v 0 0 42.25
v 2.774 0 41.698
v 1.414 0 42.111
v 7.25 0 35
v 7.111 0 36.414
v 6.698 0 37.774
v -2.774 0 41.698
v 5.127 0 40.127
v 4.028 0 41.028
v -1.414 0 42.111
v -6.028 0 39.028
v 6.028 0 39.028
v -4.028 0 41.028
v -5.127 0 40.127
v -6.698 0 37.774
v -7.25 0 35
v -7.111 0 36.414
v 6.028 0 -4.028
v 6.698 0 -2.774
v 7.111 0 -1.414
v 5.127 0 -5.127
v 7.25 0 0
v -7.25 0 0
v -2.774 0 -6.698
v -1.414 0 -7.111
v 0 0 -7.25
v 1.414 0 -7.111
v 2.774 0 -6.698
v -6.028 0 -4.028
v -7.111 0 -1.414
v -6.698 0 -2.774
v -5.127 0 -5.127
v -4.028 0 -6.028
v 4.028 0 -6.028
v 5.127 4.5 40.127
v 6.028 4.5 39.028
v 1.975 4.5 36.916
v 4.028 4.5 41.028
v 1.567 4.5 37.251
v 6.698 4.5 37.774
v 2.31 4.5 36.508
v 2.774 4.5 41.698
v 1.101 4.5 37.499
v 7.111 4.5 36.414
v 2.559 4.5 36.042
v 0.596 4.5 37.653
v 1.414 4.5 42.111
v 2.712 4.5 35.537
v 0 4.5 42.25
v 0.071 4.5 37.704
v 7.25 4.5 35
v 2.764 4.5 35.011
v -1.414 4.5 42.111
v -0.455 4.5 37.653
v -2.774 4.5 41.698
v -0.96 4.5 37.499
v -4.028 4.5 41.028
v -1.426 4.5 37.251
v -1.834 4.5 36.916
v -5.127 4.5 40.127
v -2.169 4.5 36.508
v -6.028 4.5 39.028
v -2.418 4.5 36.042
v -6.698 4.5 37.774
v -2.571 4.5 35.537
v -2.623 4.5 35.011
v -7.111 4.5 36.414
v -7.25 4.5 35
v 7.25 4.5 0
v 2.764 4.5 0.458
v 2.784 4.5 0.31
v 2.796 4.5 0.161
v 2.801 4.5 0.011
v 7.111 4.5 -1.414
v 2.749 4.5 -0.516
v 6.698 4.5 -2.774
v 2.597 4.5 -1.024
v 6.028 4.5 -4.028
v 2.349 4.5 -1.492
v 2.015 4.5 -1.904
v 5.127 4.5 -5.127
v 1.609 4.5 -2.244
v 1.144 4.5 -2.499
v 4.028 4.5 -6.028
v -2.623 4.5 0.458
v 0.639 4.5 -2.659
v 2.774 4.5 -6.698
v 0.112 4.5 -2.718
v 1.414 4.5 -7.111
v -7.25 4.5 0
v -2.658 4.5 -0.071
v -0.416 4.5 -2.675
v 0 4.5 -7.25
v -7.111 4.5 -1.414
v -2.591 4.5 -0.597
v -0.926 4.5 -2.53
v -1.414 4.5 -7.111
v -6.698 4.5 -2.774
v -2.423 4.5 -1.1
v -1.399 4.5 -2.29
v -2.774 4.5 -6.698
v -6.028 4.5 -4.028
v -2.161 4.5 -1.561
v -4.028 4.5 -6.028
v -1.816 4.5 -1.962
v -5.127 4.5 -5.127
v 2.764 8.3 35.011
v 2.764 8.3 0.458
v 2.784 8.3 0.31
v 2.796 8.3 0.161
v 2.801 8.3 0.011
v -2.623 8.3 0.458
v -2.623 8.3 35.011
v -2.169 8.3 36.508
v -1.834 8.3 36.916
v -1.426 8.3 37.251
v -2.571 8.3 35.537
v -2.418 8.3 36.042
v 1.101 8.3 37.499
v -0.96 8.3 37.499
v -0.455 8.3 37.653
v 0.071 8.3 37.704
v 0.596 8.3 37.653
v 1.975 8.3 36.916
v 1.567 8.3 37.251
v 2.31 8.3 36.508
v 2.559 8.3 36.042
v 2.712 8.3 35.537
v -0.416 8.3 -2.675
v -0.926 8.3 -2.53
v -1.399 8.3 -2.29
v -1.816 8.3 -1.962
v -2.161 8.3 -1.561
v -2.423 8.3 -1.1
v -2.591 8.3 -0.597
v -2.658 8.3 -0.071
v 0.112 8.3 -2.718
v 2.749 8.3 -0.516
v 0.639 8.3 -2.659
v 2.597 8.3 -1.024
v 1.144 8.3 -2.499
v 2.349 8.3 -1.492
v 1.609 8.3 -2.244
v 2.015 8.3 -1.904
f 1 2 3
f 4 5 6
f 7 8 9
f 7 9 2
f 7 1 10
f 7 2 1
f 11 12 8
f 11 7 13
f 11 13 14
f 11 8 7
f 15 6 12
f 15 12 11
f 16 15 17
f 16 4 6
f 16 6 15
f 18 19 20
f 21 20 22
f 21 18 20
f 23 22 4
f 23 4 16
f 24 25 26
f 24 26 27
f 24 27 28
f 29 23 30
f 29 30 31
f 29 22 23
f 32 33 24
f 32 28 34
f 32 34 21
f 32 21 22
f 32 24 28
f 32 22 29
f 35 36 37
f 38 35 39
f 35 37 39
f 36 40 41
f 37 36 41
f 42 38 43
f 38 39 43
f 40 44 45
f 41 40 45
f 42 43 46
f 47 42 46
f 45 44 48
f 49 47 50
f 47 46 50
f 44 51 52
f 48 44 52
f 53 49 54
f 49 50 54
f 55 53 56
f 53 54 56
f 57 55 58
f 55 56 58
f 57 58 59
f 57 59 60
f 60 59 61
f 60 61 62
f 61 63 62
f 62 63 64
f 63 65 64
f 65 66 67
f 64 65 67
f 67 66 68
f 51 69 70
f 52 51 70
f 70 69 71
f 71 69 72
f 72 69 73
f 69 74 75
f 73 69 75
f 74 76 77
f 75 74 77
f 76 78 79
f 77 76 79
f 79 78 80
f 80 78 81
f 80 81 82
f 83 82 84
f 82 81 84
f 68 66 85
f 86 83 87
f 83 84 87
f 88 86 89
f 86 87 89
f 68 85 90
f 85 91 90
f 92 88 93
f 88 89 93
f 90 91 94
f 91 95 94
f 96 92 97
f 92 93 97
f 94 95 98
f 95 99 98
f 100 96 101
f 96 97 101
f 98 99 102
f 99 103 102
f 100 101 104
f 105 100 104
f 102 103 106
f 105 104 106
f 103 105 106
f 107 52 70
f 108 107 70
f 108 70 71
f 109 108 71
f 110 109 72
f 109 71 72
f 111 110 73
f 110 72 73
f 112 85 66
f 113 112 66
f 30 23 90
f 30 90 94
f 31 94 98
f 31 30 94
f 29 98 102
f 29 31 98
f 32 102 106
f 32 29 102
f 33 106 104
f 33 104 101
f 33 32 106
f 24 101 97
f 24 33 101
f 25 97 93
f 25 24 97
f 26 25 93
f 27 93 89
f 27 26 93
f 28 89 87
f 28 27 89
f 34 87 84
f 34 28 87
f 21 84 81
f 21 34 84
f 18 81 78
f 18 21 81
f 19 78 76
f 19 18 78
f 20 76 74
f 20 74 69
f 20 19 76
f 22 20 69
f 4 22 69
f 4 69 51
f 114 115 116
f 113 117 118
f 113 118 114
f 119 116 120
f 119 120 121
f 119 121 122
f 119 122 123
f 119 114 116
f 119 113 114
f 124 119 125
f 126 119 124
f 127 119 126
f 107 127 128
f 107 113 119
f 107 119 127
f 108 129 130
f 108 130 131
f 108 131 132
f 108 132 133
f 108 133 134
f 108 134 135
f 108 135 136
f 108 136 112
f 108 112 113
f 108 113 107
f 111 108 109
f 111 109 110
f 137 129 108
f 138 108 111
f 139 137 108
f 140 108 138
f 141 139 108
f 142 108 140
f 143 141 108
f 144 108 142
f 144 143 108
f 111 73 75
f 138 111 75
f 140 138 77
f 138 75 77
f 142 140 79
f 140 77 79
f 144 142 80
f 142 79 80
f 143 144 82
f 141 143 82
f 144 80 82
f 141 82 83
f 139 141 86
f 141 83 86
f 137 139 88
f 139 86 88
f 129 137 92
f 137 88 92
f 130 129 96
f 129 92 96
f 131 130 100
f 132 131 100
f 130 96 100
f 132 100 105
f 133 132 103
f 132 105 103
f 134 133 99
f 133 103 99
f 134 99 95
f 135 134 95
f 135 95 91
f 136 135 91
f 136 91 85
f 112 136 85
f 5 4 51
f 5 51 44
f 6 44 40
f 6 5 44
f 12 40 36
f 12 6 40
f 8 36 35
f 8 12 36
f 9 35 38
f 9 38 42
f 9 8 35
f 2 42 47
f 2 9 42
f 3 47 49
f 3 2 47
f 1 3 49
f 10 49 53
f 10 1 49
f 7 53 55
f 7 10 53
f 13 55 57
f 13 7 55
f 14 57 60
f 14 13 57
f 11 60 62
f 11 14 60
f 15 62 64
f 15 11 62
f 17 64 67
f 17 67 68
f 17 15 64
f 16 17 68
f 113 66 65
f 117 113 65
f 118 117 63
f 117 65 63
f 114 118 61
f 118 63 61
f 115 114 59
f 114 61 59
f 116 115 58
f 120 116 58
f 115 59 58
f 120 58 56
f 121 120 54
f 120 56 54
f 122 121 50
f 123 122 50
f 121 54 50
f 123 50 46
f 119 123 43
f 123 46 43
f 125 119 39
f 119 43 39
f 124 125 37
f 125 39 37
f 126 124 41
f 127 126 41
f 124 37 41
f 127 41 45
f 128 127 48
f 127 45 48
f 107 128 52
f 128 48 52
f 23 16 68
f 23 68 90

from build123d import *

# Parameters (mm, degrees)
BOSS_EXTRUDE1_DEPTH = 4.5
BOSS_EXTRUDE2_DEPTH = 3.8
BOSS_EXTRUDE3_DEPTH = 8.1
CUT_EXTRUDE2_START  = -8.1
CUT_EXTRUDE2_DEPTH  = 8.1


with BuildPart() as part:
    # Sketch1 → Boss-Extrude1 (new body)
    with BuildSketch(Plane(origin=(0, 0, 0), x_dir=(1, 0, 0), z_dir=(0, 1, 0))):
        with BuildLine():
            Line((7.25, 0), (7.25, -35))
            ThreePointArc((7.25, -35), (0, -42.25), (-7.25, -35))
            Line((-7.25, -35), (-7.25, 0))
            ThreePointArc((-7.25, 0), (0, 7.25), (7.25, 0))
        make_face()
    extrude(amount=BOSS_EXTRUDE1_DEPTH)

    # Sketch3 → Boss-Extrude2 (add)
    with BuildSketch(Plane(origin=(0, 4.5, 0), x_dir=(1, 0, 0), z_dir=(0, 1, 0))):
        with BuildLine():
            Line((-2.622571491, -0.457666807), (-2.622571491, -0.011296081))
            Line((-2.622571491, -0.011296081), (2.763792269, -0.011296081))
            Line((2.763792269, -0.011296081), (2.763792269, -0.457666807))
            ThreePointArc((2.763792269, -0.457666807), (2.791332039, -0.235236185), (2.800532634, -0.011296081))
            ThreePointArc((2.800532634, -0.011296081), (-0.153329714, 2.709425568), (-2.622571491, -0.457666807))
        make_face()
        with BuildLine():
            Line((2.763792269, -0.011296081), (-2.622571491, -0.011296081))
            Line((-2.622571491, -0.011296081), (-2.622571491, -0.457666807))
            ThreePointArc((-2.622571491, -0.457666807), (0.070610389, -2.741218326), (2.763792269, -0.457666807))
            Line((2.763792269, -0.457666807), (2.763792269, -0.011296081))
        make_face()
        with BuildLine():
            ThreePointArc((2.763792269, -0.457666807), (0.070610389, -2.741218326), (-2.622571491, -0.457666807))
            Line((-2.622571491, -0.457666807), (-2.622571491, -35.011296081))
            ThreePointArc((-2.622571491, -35.011296081), (0.070610389, -32.318114201), (2.763792269, -35.011296081))
            Line((2.763792269, -35.011296081), (2.763792269, -0.457666807))
        make_face()
        with BuildLine():
            ThreePointArc((2.763792269, -35.011296081), (0.070610389, -32.318114201), (-2.622571491, -35.011296081))
            Line((-2.622571491, -35.011296081), (2.763792269, -35.011296081))
        make_face()
        with BuildLine():
            Line((2.763792269, -35.011296081), (-2.622571491, -35.011296081))
            ThreePointArc((-2.622571491, -35.011296081), (0.070610389, -37.704477961), (2.763792269, -35.011296081))
        make_face()
    extrude(amount=BOSS_EXTRUDE2_DEPTH)

    # Sketch4 → Boss-Extrude3 (add)
    with BuildSketch(Plane(origin=(0, 8.3, 0), x_dir=(1, 0, 0), z_dir=(0, 1, 0))):
        with BuildLine():
            Line((7.25308141, 0.014627933), (7.323691799, -34.996668148))
            ThreePointArc((7.323691799, -34.996668148), (0.085238322, -42.264377491), (-7.182471021, -35.025924014))
            Line((-7.182471021, -35.025924014), (-7.25308141, -0.014627933))
            ThreePointArc((-7.25308141, -0.014627933), (-0.014627933, 7.25308141), (7.25308141, 0.014627933))
        make_face()
    extrude(amount=BOSS_EXTRUDE3_DEPTH)

    # Sketch6 → Cut-Extrude2 (cut)
    with BuildSketch(Plane(origin=(0, 16.4, 0), x_dir=(1, 0, 0), z_dir=(0, 1, 0)).offset(CUT_EXTRUDE2_START)):
        with BuildLine():
            Line((-24.579752733, 25.941605668), (4.44385737, 25.941605668))
            Line((4.44385737, 25.941605668), (4.44385737, 5.732323751))
            ThreePointArc((4.44385737, 5.732323751), (6.509808413, 3.198405594), (7.25308141, 0.014627933))
            Line((7.25308141, 0.014627933), (7.323691799, -34.996668148))
            ThreePointArc((7.323691799, -34.996668148), (6.567208075, -38.236450718), (4.44385737, -40.797669277))
            Line((4.44385737, -40.797669277), (4.44385737, -52.11567356))
            Line((4.44385737, -52.11567356), (-24.579752733, -52.11567356))
            Line((-24.579752733, -52.11567356), (-24.579752733, -65.847384837))
            Line((-24.579752733, -65.847384837), (23.383123672, -65.847384837))
            Line((23.383123672, -65.847384837), (23.383123672, 36.458721402))
            Line((23.383123672, 36.458721402), (-24.579752733, 36.458721402))
            Line((-24.579752733, 36.458721402), (-24.579752733, 25.941605668))
        make_face()
        with BuildLine():
            Line((4.44385737, 5.732323751), (4.44385737, 25.941605668))
            Line((4.44385737, 25.941605668), (-24.579752733, 25.941605668))
            Line((-24.579752733, 25.941605668), (-24.579752733, -52.11567356))
            Line((-24.579752733, -52.11567356), (4.44385737, -52.11567356))
            Line((4.44385737, -52.11567356), (4.44385737, -40.797669277))
            ThreePointArc((4.44385737, -40.797669277), (-3.154544247, -41.507893767), (-7.182471021, -35.025924014))
            Line((-7.182471021, -35.025924014), (-7.25308141, -0.014627933))
            ThreePointArc((-7.25308141, -0.014627933), (-3.198405594, 6.509808413), (4.44385737, 5.732323751))
        make_face()
        with BuildLine():
            Line((4.44385737, -40.797669277), (4.44385737, 5.732323751))
            ThreePointArc((4.44385737, 5.732323751), (-3.198405594, 6.509808413), (-7.25308141, -0.014627933))
            Line((-7.25308141, -0.014627933), (-7.182471021, -35.025924014))
            ThreePointArc((-7.182471021, -35.025924014), (-3.154544247, -41.507893767), (4.44385737, -40.797669277))
        make_face()
        with BuildLine():
            ThreePointArc((7.25308141, 0.014627933), (6.509808413, 3.198405594), (4.44385737, 5.732323751))
            Line((4.44385737, 5.732323751), (4.44385737, -40.797669277))
            ThreePointArc((4.44385737, -40.797669277), (6.567208075, -38.236450718), (7.323691799, -34.996668148))
            Line((7.323691799, -34.996668148), (7.25308141, 0.014627933))
        make_face()
    extrude(amount=CUT_EXTRUDE2_DEPTH, mode=Mode.SUBTRACT)


solid = part.part
